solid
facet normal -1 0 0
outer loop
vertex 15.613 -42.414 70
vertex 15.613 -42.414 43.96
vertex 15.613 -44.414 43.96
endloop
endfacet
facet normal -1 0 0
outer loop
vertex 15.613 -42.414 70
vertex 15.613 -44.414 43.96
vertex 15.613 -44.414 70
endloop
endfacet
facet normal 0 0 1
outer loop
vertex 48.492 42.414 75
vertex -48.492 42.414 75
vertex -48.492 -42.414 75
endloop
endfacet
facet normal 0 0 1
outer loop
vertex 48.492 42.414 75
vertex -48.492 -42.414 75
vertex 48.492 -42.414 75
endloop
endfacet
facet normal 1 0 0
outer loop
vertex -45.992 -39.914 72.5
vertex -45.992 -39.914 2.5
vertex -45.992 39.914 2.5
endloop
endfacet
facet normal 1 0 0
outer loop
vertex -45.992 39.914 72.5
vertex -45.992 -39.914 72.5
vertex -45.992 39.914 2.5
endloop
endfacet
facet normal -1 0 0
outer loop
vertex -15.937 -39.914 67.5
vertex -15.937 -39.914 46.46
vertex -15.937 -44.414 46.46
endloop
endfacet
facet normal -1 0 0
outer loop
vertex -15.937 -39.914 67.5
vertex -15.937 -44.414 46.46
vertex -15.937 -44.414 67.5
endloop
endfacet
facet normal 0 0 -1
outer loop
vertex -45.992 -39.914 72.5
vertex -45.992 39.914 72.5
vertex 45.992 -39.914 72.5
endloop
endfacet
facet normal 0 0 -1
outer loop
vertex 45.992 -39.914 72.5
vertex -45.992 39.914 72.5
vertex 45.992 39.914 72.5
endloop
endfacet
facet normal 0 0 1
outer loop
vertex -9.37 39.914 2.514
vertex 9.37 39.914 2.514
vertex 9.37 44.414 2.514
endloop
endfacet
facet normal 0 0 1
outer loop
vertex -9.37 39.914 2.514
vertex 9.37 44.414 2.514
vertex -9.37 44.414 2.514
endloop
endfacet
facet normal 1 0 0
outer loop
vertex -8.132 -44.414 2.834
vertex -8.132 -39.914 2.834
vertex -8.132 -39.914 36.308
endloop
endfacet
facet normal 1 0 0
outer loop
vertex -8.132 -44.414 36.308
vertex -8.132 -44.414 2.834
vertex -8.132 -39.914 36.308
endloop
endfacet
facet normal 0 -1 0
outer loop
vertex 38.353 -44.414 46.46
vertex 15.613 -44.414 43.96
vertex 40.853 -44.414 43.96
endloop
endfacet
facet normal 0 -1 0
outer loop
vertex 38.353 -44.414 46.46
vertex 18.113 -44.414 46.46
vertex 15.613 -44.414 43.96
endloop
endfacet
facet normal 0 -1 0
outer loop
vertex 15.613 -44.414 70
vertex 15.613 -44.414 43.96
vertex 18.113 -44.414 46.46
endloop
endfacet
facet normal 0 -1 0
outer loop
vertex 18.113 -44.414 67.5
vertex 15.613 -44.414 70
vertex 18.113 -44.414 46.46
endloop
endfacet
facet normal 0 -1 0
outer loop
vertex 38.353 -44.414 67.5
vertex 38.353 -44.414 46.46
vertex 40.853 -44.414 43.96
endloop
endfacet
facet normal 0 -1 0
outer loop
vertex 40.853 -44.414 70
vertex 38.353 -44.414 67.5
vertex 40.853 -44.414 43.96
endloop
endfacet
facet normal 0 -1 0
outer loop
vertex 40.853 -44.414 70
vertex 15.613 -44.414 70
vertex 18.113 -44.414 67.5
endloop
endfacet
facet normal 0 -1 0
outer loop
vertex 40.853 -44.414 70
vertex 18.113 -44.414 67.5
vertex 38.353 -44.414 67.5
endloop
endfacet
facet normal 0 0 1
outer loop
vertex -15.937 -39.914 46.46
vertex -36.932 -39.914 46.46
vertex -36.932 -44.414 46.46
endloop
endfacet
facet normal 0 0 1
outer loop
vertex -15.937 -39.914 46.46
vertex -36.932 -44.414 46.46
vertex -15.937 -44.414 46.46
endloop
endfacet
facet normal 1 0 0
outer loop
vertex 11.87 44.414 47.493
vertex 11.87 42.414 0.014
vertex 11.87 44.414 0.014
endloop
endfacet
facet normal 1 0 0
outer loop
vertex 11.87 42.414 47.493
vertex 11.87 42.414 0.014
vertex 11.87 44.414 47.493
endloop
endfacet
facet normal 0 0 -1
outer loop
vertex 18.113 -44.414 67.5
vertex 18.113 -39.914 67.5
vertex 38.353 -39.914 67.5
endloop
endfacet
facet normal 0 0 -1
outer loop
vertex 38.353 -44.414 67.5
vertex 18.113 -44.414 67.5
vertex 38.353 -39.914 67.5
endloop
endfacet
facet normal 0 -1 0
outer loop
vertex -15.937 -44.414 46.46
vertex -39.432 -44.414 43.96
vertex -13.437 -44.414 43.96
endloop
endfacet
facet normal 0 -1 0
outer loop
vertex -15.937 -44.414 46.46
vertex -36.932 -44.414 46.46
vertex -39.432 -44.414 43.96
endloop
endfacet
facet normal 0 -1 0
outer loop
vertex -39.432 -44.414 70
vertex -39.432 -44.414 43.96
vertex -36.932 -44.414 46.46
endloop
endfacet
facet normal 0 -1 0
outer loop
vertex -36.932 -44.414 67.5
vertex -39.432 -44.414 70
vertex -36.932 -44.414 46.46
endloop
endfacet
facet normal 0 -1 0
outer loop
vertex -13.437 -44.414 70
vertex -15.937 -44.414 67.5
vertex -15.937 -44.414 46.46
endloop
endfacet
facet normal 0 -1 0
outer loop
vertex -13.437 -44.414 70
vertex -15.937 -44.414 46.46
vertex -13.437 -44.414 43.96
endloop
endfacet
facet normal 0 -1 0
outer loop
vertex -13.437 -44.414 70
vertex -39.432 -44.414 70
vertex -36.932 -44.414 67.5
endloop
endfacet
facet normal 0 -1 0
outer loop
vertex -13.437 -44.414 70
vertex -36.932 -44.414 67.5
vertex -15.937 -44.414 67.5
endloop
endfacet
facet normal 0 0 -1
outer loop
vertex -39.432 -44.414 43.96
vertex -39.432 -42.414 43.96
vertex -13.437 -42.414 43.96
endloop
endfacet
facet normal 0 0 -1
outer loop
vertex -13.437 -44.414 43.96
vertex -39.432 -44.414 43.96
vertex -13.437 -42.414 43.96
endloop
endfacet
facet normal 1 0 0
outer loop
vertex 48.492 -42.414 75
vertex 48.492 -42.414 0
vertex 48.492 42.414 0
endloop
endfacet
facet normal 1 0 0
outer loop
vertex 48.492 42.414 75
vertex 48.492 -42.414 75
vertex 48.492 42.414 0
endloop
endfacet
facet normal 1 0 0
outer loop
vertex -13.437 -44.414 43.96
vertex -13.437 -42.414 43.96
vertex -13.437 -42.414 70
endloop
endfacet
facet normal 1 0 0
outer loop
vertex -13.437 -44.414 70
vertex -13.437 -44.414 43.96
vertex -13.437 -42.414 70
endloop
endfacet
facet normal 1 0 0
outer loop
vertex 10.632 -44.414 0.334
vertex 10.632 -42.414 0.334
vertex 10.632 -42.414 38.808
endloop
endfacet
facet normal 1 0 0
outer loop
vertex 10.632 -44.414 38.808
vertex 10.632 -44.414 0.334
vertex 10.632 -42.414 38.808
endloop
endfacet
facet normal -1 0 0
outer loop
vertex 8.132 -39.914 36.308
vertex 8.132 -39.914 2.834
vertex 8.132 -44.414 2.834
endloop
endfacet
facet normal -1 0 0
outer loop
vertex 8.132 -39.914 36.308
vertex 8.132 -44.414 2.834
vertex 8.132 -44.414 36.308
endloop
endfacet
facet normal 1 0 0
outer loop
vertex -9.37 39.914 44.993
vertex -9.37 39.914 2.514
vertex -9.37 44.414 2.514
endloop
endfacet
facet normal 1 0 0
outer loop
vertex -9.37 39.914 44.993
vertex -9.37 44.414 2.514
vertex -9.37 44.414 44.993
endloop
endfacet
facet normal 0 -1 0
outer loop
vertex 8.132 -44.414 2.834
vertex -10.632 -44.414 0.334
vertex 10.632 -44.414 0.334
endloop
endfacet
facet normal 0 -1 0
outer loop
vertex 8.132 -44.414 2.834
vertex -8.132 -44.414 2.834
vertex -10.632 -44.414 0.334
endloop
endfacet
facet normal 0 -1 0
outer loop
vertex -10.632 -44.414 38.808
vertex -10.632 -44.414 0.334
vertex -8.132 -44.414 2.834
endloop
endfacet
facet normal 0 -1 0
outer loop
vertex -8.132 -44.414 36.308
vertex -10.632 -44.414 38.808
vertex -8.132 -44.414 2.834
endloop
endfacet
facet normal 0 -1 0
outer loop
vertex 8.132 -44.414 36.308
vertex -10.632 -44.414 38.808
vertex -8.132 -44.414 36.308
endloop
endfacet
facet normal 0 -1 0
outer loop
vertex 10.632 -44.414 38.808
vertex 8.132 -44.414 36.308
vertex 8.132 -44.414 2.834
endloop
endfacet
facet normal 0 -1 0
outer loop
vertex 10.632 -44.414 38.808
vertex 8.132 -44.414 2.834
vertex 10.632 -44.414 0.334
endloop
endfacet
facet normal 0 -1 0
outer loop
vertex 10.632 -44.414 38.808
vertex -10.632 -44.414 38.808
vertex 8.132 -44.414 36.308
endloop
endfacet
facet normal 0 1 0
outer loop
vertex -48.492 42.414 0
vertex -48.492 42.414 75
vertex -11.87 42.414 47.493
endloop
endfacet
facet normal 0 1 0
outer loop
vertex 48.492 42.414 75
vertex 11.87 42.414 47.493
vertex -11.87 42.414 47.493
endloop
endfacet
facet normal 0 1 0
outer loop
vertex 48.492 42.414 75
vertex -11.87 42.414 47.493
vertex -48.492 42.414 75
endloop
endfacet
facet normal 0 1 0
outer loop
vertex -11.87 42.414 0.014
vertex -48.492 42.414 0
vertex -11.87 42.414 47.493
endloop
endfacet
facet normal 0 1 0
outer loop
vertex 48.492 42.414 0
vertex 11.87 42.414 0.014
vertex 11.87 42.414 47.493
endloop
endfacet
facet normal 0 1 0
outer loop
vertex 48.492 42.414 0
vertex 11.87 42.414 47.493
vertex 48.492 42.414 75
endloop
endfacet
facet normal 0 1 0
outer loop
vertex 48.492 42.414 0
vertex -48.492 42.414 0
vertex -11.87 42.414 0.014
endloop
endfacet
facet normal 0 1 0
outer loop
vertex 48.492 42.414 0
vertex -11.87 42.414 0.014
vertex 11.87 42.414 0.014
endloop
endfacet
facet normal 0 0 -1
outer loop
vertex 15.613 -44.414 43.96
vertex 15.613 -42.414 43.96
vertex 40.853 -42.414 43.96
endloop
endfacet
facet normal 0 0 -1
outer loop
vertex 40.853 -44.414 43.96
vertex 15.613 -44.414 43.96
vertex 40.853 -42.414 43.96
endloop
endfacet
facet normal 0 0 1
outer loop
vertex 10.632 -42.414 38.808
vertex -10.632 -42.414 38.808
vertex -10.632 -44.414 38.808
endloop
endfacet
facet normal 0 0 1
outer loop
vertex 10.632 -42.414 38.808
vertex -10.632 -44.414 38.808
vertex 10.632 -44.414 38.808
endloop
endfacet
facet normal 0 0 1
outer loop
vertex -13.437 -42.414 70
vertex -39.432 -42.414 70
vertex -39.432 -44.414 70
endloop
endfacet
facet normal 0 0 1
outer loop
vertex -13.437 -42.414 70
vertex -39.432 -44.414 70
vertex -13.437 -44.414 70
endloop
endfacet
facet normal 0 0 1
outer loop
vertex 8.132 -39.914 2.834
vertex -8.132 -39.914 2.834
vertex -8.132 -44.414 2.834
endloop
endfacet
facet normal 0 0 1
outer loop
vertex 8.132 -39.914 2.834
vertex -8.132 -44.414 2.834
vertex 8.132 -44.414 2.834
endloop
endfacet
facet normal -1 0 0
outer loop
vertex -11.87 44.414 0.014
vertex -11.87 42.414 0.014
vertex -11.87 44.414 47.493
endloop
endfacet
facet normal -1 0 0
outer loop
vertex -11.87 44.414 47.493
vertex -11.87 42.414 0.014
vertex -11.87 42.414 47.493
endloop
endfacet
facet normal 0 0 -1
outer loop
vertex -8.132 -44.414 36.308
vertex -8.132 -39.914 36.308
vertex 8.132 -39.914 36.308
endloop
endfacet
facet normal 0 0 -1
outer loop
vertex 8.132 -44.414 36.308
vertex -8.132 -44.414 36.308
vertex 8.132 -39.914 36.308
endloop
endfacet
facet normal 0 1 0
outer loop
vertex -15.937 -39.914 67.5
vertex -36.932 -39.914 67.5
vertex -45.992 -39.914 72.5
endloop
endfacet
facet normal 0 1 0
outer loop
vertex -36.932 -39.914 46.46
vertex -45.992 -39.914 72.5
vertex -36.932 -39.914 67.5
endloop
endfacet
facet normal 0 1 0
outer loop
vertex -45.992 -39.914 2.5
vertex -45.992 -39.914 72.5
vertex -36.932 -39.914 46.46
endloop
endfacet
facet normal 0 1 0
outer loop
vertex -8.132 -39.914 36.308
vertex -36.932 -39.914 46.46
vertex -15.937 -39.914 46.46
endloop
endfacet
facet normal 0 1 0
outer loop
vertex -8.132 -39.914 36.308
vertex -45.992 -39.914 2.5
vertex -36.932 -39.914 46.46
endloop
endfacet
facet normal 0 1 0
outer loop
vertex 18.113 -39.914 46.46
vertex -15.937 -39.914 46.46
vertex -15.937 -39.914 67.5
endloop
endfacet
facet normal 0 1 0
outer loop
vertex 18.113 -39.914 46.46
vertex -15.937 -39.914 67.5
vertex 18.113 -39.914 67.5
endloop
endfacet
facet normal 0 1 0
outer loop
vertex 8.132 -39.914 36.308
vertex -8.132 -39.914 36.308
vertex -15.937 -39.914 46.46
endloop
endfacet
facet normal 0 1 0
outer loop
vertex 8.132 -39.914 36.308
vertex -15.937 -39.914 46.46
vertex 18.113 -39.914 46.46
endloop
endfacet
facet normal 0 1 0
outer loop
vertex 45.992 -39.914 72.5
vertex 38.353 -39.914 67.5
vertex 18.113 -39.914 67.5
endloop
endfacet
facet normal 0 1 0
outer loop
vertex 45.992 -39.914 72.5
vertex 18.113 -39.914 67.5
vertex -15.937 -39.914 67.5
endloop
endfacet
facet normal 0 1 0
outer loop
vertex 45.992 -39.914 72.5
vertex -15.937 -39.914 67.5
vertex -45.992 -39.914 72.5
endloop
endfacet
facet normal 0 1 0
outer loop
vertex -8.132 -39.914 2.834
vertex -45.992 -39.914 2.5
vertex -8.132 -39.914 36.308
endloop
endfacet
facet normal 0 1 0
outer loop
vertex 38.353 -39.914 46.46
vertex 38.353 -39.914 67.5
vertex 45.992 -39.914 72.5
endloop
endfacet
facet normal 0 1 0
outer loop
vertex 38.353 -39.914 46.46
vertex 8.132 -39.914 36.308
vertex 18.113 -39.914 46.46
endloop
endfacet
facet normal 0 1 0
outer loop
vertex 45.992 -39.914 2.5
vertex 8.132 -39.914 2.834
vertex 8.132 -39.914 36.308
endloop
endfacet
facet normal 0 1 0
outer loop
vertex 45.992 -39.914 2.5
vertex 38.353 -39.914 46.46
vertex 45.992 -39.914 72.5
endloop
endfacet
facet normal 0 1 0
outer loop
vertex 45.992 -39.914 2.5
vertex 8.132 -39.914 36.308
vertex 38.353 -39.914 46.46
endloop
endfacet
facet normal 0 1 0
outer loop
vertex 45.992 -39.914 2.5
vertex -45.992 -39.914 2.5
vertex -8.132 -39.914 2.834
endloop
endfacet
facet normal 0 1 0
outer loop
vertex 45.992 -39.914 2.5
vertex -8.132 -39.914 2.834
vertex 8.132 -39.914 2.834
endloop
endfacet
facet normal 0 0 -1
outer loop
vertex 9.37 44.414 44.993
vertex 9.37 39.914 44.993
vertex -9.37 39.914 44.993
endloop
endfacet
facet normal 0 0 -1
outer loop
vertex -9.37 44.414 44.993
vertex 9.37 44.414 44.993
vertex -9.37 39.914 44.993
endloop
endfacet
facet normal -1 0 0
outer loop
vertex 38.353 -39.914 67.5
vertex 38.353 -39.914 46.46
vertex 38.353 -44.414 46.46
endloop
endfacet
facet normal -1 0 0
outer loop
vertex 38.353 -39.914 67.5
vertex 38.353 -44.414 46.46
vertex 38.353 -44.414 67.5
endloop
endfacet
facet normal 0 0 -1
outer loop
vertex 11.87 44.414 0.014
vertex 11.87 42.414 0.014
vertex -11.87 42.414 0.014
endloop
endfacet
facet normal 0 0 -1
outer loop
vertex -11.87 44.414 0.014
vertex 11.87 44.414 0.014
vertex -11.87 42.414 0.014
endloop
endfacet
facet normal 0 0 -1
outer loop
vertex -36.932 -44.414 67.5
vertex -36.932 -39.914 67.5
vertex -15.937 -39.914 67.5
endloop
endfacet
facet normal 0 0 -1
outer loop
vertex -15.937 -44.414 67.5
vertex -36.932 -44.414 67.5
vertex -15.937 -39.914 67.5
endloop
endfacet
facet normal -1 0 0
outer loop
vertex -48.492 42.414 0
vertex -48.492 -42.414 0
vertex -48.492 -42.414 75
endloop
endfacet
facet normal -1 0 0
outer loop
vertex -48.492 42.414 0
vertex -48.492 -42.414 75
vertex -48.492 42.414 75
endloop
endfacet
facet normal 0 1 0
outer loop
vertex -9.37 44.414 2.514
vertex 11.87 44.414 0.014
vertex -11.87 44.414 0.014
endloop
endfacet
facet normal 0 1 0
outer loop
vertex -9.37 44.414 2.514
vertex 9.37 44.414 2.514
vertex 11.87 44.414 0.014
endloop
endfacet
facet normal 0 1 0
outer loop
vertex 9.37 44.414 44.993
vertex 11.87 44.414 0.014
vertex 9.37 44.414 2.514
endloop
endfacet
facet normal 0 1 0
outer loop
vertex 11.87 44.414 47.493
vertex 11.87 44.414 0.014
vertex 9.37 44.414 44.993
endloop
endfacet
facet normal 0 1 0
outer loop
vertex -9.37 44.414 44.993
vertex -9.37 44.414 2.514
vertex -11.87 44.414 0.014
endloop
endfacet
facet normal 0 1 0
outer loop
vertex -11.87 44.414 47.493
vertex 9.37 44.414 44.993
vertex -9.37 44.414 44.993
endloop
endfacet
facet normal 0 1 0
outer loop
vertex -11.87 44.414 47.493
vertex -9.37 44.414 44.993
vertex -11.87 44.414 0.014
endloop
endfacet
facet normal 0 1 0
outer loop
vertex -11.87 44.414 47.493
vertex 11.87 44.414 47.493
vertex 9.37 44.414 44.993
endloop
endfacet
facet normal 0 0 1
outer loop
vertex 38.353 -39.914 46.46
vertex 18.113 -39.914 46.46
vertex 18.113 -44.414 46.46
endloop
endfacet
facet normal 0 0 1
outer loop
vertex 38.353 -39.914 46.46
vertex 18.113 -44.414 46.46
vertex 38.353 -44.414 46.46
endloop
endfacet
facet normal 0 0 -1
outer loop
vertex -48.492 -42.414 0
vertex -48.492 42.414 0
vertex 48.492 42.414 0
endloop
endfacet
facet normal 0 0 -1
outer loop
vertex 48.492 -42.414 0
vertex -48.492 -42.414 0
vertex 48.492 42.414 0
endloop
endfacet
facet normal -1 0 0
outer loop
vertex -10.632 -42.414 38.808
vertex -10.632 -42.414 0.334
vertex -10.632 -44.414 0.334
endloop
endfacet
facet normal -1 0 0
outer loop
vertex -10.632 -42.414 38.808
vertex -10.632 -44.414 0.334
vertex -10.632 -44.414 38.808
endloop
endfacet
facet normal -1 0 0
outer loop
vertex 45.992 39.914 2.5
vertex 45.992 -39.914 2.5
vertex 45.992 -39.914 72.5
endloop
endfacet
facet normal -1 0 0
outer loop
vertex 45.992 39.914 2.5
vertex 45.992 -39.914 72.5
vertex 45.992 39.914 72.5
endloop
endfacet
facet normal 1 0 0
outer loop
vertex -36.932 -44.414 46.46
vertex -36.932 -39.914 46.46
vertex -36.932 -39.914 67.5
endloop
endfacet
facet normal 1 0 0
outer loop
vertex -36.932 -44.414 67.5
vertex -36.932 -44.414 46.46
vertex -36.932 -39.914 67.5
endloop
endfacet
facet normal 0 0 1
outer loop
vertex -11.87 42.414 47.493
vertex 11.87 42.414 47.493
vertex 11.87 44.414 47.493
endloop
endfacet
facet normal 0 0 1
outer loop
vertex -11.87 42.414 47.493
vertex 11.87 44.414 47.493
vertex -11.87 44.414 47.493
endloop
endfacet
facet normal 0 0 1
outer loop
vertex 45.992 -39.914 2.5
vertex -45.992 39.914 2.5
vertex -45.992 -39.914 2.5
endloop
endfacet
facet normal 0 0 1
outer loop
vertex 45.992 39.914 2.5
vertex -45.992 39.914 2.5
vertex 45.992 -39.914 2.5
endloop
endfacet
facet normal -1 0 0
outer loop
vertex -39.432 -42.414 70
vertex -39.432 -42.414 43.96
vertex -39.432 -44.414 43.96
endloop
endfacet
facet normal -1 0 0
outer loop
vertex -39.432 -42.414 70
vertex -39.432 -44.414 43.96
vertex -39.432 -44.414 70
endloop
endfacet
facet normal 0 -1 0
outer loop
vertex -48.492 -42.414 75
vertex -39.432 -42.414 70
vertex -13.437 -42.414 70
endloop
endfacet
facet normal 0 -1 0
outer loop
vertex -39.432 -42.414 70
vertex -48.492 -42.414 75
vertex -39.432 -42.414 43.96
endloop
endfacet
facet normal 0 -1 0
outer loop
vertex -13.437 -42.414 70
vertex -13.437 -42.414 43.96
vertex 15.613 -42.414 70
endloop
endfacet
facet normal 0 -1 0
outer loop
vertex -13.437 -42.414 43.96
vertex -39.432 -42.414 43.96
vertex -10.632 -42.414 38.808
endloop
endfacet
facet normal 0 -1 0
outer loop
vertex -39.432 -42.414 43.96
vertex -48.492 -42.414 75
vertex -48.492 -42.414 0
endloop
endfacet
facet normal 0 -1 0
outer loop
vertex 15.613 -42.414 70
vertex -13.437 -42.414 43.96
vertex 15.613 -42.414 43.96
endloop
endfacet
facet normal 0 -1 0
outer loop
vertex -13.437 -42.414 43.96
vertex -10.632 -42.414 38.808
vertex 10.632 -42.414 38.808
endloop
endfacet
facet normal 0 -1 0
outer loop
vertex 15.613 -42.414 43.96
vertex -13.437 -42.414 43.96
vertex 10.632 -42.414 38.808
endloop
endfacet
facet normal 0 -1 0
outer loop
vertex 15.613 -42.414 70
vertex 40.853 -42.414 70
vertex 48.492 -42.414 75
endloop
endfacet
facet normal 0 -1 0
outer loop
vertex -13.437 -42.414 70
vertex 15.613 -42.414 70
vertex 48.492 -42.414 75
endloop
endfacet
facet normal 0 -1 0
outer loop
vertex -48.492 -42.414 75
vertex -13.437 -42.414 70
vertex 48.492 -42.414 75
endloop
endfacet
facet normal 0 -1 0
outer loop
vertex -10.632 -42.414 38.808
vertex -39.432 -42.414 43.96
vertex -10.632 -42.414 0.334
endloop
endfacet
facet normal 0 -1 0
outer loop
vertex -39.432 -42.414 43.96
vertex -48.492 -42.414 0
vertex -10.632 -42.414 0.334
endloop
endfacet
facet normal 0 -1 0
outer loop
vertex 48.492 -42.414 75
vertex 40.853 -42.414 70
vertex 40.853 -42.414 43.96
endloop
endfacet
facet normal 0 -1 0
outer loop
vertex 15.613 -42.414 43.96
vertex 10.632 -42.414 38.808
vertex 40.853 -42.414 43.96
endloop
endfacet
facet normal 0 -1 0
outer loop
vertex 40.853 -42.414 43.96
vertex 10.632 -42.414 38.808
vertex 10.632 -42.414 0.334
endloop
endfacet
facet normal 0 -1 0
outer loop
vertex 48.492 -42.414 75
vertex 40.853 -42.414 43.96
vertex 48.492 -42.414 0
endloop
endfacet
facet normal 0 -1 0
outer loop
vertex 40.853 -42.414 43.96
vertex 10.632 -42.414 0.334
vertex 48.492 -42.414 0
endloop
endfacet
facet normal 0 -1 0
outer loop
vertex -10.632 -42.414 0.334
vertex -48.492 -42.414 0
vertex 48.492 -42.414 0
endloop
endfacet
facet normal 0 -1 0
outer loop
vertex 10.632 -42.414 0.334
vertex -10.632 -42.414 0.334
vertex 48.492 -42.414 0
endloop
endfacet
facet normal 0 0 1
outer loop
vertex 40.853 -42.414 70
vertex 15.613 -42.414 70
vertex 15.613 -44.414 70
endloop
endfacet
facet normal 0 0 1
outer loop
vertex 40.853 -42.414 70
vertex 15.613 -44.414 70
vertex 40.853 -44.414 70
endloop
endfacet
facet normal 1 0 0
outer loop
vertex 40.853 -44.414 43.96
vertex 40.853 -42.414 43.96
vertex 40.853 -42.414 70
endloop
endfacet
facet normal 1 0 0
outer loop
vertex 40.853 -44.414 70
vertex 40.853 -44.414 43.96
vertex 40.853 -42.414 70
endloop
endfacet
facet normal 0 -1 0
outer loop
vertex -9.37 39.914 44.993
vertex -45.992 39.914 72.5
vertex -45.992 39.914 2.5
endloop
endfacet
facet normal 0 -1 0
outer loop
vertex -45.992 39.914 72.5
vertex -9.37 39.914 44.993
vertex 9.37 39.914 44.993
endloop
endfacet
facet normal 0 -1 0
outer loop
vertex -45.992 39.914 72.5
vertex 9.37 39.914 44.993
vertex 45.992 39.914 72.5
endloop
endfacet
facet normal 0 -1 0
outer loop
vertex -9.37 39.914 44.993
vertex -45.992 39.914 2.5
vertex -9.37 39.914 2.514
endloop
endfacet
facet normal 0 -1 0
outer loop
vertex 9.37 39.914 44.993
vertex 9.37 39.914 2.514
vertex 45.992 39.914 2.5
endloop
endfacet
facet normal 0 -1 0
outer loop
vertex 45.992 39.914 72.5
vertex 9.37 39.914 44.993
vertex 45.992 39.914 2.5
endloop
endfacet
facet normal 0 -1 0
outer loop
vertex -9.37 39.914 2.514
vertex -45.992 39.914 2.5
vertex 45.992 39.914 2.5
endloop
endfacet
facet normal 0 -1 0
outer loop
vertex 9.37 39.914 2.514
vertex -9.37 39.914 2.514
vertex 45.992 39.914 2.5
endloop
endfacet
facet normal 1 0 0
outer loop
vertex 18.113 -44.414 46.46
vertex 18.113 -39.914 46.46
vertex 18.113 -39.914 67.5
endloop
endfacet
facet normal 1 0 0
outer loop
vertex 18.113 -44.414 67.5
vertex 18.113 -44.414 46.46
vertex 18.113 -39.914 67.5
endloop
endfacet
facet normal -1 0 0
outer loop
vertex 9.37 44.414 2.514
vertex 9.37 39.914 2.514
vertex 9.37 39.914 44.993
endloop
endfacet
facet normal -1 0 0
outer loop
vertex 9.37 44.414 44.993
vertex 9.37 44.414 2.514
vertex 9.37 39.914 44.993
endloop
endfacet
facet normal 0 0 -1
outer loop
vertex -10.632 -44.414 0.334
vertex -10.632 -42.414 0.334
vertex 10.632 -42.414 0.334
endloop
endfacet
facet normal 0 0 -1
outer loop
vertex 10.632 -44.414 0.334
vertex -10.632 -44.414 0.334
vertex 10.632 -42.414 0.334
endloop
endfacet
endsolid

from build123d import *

# Parameters (mm, degrees)
F0_W     = 96.9840660691
F0_H     = 84.8280265927
F1_DEPTH = 75
F2_W     = 21.263839677
F2_H     = 38.4748987854
F3_DEPTH = 2
F4_W     = 25.9946249425
F4_H     = 26.0400751024
F4_W_2   = 25.2393023088
F5_DEPTH = 2
F6_W     = 23.7395130098
F6_H     = 47.4790297449
F7_DEPTH = 2
F8_T     = -2.5


with BuildPart() as f1:
    # F0 (on Top) → F1 (new body)
    with BuildSketch(Plane.XY):
        Rectangle(F0_W, F0_H)
    extrude(amount=F1_DEPTH)

    # F2 (on face) → F3 (join)
    with BuildSketch(Plane.XZ.offset(42.4140132964)):
        with Locations((0, 19.5709709078)):
            Rectangle(F2_W, F2_H)
    extrude(amount=F3_DEPTH)

    # F4 (on face) → F5 (join)
    with BuildSketch(Plane.XZ.offset(42.4140132964)):
        with Locations((-26.4344327152, 56.980330497)):
            Rectangle(F4_W, F4_H)
        with Locations((28.2331126402, 56.980330497)):
            Rectangle(F4_W_2, F4_H)
    extrude(amount=F5_DEPTH)

    # F6 (on face) → F7 (join)
    with BuildSketch(Plane(origin=(0, 42.4140132964, 0), x_dir=(-1, 0, 0), z_dir=(0, 1, 0))):
        with Locations((0, 23.7531457096)):
            Rectangle(F6_W, F6_H)
    extrude(amount=F7_DEPTH)

    # F8
    f8_openings = [f1.faces().sort_by_distance(p)[0] for p in [
        (0, 44.414013, 23.753146),
        (-26.434433, -44.414013, 56.98033),
        (28.233113, -44.414013, 56.98033),
        (0, -44.414013, 19.570971),
    ]]
    offset(amount=F8_T, openings=f8_openings, kind=Kind.INTERSECTION)


solid = f1.part
